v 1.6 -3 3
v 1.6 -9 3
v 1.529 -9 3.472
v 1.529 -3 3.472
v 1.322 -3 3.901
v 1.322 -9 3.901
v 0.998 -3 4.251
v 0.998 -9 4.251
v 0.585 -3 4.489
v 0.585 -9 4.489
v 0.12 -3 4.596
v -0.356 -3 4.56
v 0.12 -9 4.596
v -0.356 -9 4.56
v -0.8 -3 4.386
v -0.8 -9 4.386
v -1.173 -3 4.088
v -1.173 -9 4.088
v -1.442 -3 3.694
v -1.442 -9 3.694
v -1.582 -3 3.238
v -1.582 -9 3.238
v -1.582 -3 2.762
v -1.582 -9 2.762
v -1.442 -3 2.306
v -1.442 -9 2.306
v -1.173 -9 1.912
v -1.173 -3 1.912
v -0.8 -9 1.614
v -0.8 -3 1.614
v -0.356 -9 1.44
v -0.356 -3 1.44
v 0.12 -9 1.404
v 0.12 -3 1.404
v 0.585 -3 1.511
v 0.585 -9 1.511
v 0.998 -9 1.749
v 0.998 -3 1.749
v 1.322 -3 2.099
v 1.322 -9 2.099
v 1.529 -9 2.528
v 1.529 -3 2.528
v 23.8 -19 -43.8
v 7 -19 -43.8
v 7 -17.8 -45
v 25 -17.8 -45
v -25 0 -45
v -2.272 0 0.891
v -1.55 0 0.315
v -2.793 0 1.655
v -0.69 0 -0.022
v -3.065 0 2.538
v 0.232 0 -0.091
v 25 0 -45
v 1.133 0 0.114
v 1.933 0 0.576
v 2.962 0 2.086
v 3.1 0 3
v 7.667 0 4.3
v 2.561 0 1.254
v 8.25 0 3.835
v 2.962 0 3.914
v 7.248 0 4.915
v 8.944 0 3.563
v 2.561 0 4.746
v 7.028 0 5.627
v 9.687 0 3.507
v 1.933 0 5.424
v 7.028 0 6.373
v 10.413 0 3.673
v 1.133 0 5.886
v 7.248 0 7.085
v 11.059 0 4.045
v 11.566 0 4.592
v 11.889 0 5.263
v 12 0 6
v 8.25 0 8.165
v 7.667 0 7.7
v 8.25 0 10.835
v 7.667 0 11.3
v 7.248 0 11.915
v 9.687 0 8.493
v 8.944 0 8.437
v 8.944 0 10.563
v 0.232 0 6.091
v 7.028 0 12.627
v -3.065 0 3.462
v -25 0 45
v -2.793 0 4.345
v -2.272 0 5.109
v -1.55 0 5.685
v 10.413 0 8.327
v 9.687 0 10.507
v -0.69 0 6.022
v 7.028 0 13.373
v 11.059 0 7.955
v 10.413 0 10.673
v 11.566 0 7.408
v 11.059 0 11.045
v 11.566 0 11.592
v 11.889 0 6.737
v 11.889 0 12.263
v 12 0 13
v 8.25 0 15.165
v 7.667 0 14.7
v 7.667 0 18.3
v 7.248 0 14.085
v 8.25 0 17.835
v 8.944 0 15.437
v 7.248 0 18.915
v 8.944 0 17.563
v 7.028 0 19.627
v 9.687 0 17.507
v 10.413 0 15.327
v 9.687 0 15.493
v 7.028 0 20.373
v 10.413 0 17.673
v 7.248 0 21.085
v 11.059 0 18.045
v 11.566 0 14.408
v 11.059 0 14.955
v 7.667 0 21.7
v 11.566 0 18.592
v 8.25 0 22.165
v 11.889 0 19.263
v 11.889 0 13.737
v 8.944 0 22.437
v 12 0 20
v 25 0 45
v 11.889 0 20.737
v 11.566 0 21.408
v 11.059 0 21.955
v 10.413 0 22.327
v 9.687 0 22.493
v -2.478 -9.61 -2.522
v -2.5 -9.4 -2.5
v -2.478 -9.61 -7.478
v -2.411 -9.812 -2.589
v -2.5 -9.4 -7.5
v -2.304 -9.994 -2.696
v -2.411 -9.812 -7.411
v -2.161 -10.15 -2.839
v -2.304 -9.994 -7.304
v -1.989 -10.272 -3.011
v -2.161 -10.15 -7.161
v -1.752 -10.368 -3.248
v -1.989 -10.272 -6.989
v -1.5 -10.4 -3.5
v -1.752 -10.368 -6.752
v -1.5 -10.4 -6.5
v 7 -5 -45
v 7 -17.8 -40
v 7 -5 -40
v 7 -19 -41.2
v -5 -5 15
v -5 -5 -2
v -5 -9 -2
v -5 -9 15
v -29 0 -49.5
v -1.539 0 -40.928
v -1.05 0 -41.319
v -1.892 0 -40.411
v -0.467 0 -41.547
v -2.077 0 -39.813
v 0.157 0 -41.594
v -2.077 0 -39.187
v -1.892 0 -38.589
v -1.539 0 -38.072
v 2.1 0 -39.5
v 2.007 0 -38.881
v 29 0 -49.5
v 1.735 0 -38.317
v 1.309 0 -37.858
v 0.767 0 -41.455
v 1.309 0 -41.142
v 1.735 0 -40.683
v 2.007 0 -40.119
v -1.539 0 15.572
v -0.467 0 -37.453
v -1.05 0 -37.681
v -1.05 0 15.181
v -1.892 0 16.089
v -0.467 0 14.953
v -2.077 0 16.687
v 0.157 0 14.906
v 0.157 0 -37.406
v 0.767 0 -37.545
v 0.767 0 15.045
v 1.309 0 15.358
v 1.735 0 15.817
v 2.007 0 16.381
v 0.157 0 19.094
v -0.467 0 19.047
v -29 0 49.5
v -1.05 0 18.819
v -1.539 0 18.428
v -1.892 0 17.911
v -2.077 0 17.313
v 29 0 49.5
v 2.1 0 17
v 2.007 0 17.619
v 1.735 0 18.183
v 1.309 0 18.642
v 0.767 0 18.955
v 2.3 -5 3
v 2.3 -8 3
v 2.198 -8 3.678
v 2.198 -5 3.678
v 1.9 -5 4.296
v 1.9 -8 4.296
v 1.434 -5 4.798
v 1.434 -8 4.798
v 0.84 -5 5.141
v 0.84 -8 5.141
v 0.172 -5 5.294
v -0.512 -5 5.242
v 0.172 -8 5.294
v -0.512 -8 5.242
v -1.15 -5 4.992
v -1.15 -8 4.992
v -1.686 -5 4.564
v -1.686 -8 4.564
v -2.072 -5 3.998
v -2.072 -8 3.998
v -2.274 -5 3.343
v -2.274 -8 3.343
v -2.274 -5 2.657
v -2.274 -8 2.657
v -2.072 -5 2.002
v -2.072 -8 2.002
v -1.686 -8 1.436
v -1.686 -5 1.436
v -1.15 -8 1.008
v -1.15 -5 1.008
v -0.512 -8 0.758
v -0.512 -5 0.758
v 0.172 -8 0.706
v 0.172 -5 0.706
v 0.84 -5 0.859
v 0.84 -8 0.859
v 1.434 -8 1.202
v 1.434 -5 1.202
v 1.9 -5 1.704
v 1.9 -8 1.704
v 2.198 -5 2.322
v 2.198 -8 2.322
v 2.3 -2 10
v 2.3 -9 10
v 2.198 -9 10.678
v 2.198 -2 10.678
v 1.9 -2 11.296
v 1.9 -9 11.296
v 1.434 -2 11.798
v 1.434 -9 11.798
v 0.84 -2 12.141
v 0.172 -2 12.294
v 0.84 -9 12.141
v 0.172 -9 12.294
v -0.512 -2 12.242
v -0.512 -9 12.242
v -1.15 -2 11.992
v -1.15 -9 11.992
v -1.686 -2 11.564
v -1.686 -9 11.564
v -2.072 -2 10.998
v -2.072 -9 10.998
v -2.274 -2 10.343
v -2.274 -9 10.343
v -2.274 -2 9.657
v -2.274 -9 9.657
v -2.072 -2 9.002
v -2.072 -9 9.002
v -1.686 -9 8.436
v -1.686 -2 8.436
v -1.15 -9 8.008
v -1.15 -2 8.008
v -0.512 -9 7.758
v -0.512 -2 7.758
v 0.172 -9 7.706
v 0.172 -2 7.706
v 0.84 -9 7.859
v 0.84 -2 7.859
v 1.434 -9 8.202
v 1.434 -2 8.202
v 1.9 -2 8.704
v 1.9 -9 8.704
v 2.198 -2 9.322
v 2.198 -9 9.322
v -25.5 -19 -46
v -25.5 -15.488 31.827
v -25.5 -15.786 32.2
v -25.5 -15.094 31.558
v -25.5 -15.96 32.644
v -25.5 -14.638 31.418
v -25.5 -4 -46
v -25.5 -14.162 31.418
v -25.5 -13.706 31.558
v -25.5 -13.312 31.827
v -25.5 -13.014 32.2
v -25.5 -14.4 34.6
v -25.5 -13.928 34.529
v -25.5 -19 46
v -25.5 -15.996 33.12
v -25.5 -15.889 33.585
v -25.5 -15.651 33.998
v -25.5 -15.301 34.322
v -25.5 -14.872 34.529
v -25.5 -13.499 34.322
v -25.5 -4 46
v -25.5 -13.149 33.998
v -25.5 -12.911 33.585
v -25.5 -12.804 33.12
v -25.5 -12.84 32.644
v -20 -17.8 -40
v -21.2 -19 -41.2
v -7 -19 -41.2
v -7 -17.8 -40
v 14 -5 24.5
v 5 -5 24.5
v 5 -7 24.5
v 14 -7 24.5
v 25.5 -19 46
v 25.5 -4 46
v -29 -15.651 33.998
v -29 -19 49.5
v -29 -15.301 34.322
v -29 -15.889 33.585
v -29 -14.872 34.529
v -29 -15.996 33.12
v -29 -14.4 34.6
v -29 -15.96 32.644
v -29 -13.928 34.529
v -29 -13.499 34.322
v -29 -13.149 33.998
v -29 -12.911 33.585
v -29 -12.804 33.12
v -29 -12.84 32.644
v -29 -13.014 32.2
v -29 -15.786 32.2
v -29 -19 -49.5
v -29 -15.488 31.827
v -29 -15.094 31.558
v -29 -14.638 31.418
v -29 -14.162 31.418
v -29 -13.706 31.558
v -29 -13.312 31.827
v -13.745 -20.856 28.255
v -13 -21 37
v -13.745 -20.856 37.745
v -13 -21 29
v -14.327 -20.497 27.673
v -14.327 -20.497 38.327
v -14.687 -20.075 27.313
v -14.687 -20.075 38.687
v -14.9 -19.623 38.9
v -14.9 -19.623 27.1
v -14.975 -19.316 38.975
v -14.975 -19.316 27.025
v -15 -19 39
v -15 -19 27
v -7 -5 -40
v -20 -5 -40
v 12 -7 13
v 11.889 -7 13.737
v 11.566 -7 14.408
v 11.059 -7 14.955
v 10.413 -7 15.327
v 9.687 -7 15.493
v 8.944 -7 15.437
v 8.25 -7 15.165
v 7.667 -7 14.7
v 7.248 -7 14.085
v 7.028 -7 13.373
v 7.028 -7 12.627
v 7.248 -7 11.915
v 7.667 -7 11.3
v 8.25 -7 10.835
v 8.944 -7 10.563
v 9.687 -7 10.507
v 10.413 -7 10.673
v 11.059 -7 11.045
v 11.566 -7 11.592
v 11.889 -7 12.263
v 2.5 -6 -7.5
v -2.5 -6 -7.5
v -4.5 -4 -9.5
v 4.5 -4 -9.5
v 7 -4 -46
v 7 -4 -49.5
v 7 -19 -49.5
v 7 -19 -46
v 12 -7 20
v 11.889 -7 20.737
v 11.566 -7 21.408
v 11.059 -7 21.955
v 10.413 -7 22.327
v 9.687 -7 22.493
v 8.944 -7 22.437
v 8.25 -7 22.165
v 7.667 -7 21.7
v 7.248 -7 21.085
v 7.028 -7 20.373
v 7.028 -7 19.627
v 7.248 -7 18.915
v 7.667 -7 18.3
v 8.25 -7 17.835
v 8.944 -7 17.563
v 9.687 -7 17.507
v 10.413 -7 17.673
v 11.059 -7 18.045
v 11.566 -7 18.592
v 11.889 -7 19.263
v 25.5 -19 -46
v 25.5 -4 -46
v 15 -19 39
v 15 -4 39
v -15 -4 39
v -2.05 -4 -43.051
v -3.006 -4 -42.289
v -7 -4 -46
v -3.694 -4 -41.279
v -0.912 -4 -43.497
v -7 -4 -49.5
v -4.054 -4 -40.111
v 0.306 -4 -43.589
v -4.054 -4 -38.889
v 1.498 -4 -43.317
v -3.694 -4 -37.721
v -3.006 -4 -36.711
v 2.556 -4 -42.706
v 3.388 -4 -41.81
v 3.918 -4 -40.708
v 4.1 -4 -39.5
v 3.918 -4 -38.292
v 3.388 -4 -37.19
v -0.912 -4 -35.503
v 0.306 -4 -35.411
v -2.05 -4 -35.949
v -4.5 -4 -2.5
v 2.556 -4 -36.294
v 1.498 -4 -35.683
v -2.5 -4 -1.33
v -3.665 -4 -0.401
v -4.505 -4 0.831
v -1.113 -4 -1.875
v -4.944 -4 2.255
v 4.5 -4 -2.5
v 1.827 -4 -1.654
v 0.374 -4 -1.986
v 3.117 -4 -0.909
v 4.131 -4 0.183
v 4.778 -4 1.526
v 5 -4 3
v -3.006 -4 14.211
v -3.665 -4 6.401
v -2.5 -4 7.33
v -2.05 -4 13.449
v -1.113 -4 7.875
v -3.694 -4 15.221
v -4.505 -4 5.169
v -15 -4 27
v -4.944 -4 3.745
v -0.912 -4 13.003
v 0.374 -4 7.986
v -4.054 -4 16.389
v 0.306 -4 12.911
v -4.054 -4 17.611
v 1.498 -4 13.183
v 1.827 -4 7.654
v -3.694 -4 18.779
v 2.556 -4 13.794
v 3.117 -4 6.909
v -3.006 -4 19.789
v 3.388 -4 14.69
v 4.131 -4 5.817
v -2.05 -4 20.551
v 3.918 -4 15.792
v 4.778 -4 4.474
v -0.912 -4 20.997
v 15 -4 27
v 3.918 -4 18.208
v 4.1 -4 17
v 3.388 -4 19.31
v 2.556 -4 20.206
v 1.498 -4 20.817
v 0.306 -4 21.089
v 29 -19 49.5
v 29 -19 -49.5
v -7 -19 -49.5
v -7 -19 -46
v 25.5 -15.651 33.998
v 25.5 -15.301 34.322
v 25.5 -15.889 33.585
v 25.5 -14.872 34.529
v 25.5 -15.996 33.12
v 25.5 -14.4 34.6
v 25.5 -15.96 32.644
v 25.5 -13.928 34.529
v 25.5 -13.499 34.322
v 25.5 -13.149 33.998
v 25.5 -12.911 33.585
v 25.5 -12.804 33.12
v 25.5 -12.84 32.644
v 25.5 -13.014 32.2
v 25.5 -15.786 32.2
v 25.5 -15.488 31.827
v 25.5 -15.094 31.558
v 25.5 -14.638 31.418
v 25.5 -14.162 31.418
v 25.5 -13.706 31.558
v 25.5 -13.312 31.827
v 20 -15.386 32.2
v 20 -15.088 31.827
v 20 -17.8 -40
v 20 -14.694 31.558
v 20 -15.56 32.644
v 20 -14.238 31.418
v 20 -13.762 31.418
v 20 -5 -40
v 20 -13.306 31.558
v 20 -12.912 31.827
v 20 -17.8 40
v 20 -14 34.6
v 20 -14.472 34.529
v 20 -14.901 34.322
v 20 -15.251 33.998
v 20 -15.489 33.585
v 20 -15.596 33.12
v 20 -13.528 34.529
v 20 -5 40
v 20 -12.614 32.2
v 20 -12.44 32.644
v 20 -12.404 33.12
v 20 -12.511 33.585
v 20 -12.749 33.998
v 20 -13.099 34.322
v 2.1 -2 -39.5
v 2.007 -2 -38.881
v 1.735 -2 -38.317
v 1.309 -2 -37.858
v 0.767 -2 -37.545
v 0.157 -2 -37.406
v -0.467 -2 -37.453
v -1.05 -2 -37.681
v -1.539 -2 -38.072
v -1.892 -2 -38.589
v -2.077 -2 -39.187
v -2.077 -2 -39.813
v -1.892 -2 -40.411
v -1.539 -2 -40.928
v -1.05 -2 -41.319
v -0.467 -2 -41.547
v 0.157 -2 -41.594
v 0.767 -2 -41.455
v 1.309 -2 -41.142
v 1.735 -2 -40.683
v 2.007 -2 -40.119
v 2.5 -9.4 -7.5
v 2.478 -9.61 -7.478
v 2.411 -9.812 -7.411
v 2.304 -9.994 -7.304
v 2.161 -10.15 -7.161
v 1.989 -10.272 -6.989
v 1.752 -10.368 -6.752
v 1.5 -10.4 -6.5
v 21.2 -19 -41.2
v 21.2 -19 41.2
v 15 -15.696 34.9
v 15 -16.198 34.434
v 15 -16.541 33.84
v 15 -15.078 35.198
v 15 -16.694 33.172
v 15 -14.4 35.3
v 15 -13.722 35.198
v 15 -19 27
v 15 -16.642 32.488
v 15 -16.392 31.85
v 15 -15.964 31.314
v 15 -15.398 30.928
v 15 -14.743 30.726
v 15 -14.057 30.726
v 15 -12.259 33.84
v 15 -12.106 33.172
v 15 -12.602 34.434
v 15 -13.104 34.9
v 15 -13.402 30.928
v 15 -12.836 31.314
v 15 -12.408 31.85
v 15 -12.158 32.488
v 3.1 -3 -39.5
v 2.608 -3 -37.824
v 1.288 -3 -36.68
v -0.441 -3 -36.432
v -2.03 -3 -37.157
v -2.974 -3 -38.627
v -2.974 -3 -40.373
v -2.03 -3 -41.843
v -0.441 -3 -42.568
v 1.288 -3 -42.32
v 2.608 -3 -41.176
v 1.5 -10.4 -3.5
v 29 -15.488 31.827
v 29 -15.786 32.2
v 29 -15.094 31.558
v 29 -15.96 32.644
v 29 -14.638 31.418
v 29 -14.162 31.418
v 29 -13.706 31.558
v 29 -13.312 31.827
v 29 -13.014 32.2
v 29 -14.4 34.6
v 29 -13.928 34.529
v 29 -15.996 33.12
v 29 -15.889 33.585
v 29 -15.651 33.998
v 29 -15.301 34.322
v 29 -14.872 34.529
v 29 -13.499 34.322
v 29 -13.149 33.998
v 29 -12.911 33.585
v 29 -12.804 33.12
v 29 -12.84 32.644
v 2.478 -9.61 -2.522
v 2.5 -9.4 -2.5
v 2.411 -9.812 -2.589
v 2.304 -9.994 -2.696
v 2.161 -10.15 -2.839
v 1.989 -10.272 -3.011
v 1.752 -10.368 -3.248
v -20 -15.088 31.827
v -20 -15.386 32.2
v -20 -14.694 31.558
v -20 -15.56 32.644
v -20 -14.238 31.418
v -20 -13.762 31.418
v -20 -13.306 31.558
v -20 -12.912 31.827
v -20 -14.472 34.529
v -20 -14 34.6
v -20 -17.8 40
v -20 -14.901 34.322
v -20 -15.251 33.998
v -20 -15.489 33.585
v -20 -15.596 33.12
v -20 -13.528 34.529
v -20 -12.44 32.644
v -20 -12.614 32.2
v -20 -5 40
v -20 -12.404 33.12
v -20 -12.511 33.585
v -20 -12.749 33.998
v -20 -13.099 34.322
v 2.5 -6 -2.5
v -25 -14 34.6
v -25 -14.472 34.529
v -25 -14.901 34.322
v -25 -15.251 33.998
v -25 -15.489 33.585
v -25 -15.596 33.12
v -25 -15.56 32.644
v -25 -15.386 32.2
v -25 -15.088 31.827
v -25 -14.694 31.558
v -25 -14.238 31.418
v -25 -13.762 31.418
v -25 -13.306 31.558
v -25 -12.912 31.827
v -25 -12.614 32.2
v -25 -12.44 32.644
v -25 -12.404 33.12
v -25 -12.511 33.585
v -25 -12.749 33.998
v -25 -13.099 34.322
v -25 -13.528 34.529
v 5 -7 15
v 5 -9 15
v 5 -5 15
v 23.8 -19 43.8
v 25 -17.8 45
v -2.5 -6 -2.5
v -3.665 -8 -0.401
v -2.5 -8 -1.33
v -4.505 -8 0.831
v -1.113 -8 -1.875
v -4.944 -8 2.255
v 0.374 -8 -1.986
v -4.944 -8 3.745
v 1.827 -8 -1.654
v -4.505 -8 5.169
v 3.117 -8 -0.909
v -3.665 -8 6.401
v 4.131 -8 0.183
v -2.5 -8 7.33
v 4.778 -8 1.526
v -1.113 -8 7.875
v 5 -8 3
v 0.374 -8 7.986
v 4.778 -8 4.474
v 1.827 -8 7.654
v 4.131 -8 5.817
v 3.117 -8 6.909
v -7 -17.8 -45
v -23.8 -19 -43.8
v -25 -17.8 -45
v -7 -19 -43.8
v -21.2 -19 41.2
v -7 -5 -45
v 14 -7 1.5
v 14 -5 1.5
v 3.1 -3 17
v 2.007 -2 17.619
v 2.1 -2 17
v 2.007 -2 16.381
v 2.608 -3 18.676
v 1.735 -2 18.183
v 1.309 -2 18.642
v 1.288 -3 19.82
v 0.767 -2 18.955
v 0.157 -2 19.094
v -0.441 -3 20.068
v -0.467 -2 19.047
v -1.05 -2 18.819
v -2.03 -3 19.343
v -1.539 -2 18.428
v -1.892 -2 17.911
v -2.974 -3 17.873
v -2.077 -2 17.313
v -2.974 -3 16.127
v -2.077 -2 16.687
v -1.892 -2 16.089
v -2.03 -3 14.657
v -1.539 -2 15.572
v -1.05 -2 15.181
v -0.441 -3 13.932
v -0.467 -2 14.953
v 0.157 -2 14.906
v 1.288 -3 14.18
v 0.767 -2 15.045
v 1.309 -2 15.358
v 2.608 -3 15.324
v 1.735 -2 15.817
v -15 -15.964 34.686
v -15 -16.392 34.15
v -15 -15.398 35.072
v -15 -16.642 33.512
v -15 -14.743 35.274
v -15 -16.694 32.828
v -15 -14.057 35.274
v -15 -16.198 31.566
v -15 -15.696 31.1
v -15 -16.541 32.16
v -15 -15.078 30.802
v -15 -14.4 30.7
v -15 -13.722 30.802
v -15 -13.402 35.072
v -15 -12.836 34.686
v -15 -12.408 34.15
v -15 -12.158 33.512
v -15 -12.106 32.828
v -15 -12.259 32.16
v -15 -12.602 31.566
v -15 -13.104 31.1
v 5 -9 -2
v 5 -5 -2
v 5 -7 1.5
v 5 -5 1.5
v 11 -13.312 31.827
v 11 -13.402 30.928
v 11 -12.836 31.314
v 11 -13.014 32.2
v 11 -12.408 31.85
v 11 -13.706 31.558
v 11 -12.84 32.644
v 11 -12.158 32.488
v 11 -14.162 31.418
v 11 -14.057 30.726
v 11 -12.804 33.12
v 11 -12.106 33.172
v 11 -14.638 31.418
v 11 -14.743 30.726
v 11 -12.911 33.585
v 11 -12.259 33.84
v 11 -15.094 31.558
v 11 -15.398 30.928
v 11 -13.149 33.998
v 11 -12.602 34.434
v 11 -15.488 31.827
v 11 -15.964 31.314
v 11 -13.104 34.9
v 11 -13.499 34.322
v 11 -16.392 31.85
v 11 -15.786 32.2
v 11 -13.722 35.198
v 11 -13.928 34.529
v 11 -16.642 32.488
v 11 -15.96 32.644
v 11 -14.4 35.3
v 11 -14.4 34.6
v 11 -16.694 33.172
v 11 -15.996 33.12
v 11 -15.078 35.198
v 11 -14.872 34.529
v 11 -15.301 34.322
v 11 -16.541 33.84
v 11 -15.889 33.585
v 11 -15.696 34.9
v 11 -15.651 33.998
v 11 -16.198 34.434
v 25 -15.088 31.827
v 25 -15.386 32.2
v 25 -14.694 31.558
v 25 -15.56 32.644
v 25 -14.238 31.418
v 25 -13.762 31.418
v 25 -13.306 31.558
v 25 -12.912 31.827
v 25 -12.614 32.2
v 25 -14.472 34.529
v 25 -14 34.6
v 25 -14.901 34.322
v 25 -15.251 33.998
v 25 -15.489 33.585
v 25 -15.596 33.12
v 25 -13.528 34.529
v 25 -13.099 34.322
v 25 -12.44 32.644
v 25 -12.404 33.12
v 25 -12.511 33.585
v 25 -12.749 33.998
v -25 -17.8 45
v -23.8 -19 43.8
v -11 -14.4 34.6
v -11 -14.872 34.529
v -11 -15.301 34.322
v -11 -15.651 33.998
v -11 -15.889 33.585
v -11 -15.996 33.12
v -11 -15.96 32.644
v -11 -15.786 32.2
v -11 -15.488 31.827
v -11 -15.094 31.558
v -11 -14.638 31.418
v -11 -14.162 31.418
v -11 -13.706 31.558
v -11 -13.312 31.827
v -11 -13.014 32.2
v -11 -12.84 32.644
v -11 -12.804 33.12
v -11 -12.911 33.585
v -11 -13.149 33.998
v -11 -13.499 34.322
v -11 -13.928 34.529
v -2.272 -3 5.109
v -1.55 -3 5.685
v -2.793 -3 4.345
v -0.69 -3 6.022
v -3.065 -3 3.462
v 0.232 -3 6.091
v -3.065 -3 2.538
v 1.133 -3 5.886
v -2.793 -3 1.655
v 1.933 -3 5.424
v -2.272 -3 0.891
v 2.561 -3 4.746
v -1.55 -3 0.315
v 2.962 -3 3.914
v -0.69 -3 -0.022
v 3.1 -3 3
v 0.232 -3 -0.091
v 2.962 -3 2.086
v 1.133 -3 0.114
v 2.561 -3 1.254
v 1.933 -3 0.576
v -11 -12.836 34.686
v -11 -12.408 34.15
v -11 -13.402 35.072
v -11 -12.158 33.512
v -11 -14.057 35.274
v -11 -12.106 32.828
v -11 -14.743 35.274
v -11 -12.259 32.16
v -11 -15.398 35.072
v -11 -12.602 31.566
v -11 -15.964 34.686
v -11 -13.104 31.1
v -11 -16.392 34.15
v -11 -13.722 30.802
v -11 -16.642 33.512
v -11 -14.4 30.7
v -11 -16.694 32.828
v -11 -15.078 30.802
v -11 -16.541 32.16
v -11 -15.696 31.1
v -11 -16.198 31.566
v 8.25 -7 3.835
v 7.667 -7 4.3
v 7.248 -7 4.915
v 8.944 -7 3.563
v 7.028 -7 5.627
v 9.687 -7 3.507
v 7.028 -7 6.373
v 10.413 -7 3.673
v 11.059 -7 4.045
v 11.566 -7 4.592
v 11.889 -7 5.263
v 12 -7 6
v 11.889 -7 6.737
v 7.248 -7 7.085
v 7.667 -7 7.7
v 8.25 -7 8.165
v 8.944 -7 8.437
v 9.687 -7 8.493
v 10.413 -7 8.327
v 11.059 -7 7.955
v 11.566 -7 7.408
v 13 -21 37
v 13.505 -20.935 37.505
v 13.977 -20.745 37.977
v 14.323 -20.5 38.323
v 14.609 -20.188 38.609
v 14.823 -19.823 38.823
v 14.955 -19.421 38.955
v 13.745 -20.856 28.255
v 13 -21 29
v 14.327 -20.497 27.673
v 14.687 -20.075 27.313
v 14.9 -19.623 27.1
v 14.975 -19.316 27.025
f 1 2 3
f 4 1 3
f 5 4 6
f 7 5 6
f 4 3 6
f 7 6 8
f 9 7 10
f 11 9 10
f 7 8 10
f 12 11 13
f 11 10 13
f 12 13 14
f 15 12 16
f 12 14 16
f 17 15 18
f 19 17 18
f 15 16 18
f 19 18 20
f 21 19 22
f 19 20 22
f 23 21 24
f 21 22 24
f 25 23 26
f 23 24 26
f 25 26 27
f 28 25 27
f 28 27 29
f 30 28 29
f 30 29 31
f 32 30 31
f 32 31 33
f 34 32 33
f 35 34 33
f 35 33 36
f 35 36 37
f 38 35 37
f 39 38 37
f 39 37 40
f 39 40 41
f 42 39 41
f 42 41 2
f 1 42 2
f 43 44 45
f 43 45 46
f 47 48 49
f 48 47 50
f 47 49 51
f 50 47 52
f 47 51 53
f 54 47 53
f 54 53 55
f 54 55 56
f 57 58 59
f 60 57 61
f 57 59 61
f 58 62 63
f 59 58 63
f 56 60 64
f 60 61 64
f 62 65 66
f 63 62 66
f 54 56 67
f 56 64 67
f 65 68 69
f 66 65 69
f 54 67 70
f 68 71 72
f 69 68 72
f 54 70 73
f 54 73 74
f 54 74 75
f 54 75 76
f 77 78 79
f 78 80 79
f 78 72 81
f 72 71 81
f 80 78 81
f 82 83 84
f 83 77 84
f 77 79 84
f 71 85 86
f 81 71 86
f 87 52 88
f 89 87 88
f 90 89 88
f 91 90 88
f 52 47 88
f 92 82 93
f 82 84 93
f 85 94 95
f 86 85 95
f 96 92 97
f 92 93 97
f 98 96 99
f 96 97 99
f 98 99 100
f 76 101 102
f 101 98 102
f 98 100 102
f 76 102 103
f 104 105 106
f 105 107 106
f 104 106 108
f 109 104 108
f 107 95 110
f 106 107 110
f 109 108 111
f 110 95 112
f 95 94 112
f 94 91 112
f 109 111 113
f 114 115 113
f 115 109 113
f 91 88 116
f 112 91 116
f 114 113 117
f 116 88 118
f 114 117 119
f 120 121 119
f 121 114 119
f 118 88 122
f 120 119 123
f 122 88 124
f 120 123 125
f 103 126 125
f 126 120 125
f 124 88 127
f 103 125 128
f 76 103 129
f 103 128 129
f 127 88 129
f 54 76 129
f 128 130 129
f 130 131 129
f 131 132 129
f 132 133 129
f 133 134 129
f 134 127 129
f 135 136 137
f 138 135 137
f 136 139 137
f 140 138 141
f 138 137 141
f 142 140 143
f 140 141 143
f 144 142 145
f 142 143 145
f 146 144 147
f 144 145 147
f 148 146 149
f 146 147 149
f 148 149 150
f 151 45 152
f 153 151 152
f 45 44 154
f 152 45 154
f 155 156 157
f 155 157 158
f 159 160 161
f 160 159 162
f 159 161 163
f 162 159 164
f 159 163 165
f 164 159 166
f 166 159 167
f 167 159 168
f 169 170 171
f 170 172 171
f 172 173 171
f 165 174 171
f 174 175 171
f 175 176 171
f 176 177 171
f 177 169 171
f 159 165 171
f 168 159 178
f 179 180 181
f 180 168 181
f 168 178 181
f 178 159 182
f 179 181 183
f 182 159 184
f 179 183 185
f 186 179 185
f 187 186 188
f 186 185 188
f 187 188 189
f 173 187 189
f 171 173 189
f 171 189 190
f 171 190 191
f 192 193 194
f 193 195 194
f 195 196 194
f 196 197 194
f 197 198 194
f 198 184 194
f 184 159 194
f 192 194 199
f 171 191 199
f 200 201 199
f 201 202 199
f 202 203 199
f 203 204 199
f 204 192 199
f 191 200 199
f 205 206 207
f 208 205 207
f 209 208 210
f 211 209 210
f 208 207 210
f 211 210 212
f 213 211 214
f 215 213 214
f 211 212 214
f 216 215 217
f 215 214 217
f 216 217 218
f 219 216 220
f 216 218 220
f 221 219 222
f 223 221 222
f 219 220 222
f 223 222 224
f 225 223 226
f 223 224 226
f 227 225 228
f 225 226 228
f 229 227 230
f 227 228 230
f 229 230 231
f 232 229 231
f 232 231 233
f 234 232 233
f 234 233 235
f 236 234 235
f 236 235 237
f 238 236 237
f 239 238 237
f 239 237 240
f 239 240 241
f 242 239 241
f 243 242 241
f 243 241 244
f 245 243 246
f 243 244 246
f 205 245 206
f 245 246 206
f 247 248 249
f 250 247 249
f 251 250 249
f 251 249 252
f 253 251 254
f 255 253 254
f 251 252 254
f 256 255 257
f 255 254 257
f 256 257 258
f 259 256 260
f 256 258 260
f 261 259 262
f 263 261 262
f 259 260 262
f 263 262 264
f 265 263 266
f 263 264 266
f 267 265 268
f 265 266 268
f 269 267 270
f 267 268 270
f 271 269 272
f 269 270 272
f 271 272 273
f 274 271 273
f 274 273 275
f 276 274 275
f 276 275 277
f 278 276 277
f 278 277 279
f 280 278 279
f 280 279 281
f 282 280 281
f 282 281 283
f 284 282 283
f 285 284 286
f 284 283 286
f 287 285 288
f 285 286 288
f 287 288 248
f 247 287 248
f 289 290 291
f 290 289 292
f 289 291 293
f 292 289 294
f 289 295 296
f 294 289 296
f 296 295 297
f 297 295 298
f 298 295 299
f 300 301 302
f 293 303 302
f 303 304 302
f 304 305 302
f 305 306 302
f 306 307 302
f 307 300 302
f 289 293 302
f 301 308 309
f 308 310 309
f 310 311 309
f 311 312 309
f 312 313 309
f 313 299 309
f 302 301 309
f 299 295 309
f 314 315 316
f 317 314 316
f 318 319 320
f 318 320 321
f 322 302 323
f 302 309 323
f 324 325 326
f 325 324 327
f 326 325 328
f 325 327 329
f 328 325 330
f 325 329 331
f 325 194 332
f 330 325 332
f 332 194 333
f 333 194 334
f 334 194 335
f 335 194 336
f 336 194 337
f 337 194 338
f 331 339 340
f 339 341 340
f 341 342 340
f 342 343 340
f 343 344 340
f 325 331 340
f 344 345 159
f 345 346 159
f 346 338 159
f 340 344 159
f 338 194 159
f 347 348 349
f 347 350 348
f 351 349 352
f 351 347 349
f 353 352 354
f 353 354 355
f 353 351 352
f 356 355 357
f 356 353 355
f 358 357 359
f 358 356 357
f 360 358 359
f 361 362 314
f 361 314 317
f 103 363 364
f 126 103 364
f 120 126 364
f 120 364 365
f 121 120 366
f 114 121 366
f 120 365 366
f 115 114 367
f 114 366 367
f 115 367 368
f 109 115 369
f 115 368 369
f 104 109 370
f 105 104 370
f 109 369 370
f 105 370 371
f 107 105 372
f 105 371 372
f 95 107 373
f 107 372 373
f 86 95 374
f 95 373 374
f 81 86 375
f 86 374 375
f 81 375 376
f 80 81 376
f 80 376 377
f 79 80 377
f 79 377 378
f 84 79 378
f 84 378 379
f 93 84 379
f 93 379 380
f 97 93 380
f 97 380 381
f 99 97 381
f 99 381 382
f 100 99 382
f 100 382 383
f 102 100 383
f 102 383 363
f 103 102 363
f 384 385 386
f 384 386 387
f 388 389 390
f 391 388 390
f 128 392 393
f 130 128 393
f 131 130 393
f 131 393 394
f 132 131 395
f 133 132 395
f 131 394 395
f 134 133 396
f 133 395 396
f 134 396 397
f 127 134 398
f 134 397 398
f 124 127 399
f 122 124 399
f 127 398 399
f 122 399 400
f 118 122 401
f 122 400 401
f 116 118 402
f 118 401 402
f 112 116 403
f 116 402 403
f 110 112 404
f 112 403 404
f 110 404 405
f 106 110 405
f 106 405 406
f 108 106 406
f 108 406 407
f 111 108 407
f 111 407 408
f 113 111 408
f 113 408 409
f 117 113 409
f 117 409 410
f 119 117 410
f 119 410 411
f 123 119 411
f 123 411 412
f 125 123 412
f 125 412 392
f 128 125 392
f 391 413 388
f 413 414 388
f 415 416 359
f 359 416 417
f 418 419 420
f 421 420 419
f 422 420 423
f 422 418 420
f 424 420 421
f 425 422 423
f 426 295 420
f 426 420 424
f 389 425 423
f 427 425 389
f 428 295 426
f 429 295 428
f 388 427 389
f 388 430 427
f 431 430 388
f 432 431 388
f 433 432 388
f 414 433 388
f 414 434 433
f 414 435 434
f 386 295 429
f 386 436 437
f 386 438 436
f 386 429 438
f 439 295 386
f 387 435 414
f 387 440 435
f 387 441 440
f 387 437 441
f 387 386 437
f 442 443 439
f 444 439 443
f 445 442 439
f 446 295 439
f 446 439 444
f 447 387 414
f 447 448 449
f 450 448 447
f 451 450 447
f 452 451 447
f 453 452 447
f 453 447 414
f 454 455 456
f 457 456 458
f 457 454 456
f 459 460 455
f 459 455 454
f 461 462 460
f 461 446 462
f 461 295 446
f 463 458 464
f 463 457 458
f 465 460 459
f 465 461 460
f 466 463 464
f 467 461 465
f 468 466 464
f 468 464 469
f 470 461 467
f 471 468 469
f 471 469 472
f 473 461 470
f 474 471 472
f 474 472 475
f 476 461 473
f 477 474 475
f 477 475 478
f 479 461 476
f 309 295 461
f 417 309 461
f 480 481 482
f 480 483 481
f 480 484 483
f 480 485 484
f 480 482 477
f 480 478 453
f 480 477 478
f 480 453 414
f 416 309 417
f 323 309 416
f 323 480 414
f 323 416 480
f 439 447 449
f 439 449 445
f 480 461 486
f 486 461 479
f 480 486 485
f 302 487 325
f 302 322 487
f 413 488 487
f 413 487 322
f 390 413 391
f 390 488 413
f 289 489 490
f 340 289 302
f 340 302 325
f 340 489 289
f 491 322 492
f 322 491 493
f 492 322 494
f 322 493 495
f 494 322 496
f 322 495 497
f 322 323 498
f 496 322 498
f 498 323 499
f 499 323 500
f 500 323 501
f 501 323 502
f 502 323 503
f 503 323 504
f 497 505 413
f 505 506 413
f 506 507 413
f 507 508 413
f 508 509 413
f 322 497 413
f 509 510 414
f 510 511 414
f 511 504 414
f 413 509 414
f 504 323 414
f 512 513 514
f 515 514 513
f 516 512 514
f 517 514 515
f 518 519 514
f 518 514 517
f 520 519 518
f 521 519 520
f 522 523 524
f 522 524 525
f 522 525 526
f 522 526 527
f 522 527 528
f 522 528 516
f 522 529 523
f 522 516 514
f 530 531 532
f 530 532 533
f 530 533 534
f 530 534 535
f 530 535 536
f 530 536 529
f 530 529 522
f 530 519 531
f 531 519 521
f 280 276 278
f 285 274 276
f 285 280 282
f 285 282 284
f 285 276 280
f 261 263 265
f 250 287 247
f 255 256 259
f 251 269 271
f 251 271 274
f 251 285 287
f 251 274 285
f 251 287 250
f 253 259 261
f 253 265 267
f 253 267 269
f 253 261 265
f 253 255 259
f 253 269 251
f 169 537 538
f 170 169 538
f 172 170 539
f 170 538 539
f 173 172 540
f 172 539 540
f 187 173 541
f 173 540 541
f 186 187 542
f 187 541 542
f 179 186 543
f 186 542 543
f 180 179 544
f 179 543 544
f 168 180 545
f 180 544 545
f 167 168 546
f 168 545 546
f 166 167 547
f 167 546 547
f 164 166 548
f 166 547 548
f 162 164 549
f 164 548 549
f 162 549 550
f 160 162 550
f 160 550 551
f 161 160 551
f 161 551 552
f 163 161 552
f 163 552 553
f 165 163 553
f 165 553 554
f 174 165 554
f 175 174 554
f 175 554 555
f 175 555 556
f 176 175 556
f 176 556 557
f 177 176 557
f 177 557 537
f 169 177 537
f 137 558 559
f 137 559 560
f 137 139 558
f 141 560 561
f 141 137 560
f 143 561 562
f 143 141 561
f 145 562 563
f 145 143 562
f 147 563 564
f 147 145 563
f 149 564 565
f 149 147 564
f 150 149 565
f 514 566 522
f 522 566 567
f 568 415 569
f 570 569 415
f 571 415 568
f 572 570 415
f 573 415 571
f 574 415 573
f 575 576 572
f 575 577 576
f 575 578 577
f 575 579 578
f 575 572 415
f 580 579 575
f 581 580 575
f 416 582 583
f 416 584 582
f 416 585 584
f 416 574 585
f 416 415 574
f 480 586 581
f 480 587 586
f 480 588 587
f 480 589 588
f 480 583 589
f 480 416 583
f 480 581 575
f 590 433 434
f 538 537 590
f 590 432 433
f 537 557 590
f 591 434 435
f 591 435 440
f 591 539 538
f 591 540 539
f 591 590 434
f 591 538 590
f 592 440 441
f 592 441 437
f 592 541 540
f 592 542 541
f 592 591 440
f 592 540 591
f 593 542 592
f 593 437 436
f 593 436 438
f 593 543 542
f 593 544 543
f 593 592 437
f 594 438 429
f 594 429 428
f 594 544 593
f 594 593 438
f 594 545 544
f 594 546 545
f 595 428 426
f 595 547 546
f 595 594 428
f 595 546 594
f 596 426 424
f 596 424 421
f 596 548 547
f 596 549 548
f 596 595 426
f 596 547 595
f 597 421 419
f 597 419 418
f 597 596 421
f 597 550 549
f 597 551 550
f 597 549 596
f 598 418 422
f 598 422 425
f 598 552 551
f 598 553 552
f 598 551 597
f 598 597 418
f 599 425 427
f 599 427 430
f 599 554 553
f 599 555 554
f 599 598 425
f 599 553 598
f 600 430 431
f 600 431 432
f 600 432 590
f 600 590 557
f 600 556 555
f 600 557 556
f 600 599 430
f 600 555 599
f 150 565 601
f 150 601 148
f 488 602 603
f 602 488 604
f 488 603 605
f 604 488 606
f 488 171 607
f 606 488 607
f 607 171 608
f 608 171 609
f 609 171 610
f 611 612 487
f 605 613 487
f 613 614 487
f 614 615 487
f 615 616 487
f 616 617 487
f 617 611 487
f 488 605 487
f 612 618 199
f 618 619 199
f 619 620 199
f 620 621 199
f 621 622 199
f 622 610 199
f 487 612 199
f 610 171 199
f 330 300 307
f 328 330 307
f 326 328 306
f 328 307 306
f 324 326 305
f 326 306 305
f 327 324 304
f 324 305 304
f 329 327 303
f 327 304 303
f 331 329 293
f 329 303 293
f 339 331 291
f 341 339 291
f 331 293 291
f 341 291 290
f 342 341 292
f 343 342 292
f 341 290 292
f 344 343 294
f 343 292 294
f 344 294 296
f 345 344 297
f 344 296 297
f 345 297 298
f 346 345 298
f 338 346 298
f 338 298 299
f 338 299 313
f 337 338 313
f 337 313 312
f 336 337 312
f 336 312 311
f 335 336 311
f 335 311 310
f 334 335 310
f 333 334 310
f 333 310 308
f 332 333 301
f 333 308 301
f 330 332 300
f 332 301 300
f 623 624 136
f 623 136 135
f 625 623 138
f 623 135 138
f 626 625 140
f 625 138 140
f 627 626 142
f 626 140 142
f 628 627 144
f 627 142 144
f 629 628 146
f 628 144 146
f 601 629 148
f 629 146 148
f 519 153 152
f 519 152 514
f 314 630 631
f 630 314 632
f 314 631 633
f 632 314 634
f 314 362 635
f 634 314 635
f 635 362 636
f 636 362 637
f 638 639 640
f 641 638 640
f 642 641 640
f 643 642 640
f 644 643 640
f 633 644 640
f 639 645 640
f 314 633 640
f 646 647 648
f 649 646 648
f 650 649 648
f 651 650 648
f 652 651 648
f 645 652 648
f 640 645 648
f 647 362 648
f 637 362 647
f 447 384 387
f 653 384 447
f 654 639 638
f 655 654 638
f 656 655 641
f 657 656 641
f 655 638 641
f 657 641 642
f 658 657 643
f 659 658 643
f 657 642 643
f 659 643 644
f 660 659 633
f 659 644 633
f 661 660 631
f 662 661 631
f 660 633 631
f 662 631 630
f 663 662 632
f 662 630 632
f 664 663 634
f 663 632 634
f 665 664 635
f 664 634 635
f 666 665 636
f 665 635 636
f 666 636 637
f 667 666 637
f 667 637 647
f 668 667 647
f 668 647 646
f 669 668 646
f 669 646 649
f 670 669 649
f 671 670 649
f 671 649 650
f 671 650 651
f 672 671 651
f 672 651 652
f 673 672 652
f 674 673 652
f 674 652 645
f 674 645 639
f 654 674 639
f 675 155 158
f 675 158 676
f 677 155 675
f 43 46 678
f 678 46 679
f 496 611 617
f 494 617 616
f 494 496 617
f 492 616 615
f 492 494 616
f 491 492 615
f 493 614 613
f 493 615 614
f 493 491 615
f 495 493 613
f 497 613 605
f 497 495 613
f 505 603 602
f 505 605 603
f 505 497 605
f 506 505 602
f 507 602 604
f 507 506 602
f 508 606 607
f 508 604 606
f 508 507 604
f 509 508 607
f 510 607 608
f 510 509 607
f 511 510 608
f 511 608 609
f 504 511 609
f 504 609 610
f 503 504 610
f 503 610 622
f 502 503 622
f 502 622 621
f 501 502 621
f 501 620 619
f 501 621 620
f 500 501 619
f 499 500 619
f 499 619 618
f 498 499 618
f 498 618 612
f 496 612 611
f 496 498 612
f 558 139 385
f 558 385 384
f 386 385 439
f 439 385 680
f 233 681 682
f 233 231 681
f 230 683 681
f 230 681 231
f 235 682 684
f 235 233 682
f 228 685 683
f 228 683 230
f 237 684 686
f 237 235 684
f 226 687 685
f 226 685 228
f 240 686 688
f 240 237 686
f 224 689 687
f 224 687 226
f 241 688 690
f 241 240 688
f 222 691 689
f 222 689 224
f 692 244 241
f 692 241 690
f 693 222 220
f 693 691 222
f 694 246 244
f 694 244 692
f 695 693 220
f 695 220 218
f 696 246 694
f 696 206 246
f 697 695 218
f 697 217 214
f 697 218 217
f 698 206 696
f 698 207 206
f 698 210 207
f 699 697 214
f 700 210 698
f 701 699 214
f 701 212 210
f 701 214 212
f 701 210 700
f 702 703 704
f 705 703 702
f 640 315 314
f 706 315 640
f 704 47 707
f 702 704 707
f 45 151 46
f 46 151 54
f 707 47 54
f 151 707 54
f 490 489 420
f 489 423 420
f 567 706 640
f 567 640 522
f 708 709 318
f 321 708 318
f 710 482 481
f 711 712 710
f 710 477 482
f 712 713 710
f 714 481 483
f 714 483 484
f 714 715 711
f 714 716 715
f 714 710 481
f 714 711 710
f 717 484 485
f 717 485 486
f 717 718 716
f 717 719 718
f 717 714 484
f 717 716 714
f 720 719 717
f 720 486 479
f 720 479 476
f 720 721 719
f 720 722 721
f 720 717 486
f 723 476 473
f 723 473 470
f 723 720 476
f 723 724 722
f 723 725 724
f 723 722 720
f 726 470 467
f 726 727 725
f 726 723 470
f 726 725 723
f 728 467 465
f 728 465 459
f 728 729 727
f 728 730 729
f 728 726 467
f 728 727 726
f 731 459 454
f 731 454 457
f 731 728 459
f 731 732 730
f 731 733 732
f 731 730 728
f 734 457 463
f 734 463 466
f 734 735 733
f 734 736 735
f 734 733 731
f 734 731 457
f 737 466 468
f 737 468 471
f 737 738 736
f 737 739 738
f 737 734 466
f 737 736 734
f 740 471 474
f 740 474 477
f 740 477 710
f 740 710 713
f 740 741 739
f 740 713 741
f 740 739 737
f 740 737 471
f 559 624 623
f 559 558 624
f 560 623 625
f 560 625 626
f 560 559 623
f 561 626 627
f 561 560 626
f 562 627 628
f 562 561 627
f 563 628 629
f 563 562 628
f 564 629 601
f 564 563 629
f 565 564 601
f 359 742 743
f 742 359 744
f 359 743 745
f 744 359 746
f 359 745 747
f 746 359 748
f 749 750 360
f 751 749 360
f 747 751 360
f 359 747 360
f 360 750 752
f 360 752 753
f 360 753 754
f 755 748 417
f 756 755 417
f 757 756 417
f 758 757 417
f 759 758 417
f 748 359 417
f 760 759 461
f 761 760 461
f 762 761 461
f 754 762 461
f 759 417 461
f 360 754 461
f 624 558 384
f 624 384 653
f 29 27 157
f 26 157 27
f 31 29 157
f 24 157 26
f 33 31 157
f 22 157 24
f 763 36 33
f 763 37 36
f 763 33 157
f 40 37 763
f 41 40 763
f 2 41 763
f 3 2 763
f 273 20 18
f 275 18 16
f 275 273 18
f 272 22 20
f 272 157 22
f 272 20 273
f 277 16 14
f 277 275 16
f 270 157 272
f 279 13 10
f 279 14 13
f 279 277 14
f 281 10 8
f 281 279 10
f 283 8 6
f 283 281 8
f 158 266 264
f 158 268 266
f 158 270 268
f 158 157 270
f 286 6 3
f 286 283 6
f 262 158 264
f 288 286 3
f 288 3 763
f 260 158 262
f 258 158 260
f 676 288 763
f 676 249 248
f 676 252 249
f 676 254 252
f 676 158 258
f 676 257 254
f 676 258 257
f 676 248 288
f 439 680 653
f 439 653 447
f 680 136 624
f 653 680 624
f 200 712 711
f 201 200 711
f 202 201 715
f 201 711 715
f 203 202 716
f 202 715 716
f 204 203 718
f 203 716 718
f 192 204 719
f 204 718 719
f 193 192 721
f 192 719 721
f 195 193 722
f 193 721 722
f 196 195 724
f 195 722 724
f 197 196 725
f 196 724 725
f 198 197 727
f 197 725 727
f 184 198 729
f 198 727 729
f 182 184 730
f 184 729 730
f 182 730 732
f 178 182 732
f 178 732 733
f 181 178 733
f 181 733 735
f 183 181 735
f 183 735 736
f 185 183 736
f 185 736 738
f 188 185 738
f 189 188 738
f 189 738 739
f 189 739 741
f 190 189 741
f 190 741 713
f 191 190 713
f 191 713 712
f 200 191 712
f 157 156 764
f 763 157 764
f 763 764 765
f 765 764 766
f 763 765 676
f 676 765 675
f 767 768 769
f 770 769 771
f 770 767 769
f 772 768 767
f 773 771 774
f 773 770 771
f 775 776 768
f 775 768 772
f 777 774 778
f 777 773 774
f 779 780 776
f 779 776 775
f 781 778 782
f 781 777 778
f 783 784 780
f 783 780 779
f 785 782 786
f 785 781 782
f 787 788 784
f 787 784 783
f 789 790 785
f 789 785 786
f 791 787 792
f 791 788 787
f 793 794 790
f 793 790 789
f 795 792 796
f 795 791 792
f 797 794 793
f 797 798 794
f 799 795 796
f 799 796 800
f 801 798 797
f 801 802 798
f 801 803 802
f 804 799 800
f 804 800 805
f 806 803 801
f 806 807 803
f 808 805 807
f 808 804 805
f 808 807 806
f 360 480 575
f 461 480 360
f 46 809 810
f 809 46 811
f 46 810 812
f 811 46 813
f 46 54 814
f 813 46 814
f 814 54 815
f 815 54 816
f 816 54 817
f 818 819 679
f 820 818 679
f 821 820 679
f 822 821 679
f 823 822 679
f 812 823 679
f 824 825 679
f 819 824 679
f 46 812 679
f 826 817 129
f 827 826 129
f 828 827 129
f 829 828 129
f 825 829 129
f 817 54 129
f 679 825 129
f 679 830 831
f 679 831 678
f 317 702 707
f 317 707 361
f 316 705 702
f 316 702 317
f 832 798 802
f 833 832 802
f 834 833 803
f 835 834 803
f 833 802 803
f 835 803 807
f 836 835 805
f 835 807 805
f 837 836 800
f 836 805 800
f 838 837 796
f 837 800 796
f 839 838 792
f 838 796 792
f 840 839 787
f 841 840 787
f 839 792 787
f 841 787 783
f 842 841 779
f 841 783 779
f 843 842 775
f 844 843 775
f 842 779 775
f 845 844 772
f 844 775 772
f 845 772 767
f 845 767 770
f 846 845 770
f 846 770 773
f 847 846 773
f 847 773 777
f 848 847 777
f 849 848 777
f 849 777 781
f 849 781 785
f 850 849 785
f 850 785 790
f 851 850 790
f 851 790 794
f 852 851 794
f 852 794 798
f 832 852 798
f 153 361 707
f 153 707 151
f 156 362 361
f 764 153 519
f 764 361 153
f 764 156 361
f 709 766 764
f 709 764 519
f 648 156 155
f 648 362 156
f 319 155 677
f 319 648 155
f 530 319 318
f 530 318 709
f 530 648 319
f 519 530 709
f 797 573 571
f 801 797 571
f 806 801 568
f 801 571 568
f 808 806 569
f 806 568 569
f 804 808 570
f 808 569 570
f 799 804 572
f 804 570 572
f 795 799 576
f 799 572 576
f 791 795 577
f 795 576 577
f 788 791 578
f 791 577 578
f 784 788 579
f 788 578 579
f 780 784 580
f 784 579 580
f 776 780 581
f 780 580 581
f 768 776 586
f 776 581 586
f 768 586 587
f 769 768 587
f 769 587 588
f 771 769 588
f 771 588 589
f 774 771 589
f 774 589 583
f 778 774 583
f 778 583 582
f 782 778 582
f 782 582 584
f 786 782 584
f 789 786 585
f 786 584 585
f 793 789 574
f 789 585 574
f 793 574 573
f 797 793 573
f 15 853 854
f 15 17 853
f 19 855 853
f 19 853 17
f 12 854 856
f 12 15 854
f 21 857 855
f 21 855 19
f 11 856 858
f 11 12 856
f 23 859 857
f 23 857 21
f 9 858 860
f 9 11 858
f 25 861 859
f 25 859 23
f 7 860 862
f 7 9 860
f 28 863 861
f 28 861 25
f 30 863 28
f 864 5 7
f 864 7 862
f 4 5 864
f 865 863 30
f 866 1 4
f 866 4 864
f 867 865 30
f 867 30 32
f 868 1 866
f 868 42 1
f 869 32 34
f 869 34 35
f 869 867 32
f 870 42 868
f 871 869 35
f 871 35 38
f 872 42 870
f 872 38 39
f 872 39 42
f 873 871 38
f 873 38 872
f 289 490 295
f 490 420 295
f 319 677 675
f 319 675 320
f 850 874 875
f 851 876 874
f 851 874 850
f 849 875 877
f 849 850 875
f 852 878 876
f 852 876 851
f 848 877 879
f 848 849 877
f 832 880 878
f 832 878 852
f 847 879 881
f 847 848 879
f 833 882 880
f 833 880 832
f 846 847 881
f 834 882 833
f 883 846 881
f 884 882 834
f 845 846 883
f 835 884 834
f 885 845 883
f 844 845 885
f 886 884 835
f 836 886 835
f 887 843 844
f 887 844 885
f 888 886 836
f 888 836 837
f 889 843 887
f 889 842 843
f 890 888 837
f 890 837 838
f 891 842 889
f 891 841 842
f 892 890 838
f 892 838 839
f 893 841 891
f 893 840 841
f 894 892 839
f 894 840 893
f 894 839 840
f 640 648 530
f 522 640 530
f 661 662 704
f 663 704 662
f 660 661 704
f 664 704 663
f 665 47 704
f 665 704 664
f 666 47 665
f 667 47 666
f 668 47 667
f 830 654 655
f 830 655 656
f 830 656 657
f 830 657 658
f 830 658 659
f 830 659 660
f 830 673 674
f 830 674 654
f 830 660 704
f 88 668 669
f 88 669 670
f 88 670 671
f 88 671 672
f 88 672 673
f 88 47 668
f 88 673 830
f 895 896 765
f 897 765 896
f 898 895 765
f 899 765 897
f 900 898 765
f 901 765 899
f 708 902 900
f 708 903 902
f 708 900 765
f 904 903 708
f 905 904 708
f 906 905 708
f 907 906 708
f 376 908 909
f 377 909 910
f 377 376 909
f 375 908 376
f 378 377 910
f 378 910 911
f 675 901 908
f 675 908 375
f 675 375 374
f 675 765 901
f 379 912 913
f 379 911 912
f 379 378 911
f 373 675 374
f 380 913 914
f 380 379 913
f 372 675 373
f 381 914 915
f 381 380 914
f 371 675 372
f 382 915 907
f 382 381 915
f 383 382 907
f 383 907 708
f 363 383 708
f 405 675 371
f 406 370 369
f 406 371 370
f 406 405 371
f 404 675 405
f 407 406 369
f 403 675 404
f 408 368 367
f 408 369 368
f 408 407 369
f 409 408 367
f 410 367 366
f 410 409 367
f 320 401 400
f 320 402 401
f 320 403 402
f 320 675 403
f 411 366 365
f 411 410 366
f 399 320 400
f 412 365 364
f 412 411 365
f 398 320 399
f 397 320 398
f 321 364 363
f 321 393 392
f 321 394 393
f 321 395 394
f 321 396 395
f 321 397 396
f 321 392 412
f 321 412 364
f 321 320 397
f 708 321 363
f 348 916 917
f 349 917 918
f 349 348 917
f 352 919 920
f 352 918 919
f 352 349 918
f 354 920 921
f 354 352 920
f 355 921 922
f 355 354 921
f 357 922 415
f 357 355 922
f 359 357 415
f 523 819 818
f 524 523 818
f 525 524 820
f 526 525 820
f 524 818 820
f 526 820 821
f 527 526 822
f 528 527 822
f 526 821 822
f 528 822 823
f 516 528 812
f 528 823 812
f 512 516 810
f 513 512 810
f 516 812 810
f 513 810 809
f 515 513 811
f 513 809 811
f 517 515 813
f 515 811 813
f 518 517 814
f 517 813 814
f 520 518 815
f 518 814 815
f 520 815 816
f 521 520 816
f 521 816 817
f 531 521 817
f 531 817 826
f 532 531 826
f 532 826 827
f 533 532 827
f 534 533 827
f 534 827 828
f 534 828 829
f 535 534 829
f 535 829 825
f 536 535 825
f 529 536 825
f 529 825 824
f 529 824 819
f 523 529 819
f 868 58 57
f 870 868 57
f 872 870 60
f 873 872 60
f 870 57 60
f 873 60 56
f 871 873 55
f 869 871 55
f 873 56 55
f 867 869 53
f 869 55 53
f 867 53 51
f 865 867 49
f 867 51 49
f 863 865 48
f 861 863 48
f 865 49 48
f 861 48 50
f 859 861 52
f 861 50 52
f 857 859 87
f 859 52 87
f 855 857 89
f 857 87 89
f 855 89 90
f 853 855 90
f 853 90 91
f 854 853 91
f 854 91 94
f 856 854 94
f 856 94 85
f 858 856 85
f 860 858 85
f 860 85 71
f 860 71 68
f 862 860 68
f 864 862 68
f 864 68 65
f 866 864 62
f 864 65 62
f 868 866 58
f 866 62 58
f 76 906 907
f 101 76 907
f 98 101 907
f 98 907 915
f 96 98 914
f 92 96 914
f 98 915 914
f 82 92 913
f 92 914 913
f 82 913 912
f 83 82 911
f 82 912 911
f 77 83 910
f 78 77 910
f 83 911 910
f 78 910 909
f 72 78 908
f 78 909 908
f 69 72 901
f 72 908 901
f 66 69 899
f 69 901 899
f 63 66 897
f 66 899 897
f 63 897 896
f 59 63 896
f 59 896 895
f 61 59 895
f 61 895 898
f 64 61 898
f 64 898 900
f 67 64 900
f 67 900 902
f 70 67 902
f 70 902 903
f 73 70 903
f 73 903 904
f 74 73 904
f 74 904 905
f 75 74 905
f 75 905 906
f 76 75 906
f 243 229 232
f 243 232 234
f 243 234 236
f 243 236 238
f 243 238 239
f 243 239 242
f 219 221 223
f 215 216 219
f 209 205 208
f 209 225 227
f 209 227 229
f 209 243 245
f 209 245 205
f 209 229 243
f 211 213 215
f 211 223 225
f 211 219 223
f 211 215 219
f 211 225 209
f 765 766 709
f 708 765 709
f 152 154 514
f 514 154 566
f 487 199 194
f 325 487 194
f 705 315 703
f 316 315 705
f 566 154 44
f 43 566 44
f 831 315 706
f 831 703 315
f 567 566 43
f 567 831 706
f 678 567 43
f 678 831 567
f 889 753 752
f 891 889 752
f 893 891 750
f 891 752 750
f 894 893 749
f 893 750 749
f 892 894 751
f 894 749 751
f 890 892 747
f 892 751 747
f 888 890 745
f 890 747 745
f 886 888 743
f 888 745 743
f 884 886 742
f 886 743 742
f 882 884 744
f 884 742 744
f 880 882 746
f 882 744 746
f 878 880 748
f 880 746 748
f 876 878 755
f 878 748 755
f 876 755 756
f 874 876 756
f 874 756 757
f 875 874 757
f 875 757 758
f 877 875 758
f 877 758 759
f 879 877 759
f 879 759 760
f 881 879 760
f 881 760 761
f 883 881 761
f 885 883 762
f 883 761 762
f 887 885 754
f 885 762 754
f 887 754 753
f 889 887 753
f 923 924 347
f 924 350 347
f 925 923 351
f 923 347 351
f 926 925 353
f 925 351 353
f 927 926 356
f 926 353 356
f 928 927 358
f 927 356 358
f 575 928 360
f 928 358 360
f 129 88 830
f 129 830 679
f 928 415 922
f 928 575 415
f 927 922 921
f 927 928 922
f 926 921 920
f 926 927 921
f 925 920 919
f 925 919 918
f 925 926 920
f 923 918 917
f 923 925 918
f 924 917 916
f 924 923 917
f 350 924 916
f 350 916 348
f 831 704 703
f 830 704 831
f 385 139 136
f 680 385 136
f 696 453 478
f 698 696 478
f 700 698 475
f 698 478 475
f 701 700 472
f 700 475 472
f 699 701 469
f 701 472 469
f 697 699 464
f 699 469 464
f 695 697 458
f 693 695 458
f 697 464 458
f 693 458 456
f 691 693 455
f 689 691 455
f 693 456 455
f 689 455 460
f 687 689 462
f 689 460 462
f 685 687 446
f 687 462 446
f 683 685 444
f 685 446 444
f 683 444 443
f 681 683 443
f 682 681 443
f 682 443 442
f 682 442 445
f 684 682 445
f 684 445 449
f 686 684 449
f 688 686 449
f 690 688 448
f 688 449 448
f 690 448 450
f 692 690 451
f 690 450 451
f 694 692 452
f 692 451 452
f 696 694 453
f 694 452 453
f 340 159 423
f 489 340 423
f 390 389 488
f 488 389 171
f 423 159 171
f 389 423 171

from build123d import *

# Parameters (mm, degrees)
SKETCH006_W          = 58
SKETCH006_H          = 99
PAD004_DEPTH         = 16
SKETCH007_W          = 51
SKETCH007_H          = 92
SKETCH007_W_2        = 30
SKETCH007_H_2        = 12
SKETCH007_W_3        = 5
SKETCH007_H_3        = 5
POCKET004_DEPTH      = 12
POCKET004_FACE21_W   = 5
POCKET004_FACE21_H   = 5
POCKET005_DEPTH      = 5.6
POCKET005_FACE20_W   = 30
POCKET005_FACE20_H   = 12
PAD005_DEPTH         = 5
SKETCH009_R          = 2.3
POCKET006_DEPTH      = 4
SKETCH010_R          = 2.3
POCKET007_DEPTH      = 4
SKETCH011_R          = 1.6
POCKET008_DEPTH      = 40.001
POCKET008_DEPTH_BACK = -18.001
FILLET_R             = 2
FILLET001_R          = 1
SKETCH012_W          = 14
SKETCH012_H          = 12
POCKET009_DEPTH      = 3.5
SKETCH015_R          = 5
PAD007_DEPTH         = 4
SKETCH016_R          = 2.3
POCKET012_DEPTH      = 3
PAD012_DEPTH         = 3
SKETCH_R             = 2.1
POCKET_DEPTH         = 4.001
CHAMFER_SIZE         = 2
CHAMFER001_SIZE      = 2
SKETCH017_W          = 50
SKETCH017_H          = 90
PAD008_DEPTH         = 5
SKETCH018_W          = 50
SKETCH018_H          = 90
SKETCH018_W_2        = 40
SKETCH018_H_2        = 80
PAD009_DEPTH         = 14
SKETCH019_W          = 14
SKETCH019_H          = 5
POCKET013_DEPTH      = 14
SKETCH020_W          = 10
SKETCH020_H          = 17
PAD010_DEPTH         = 4
SKETCH021_R          = 2.3
SKETCH021_R_2        = 1.6
POCKET014_DEPTH      = 7
POCKET014_FACE22_R   = 1.6
POCKET015_DEPTH      = 2.001
SKETCH022_R          = 3.1
POCKET016_DEPTH      = 3
SKETCH023_W          = 9
SKETCH023_H          = 23
PAD011_DEPTH         = 2
SKETCH024_R          = 2.5
POCKET017_DEPTH      = 7.001
SKETCH025_R          = 1.6
POCKET018_DEPTH      = 50.001
CHAMFER002_SIZE      = 1.2


with BuildPart() as backplate:
    # Sketch006 → Pad004 (new body)
    with BuildSketch(Plane.XZ):
        Rectangle(SKETCH006_W, SKETCH006_H)
    extrude(amount=PAD004_DEPTH)

    # Sketch007 (on Face6 of Pad004) → Pocket004 (cut)
    with BuildSketch(Plane.XZ.offset(16)):
        Rectangle(SKETCH007_W, SKETCH007_H)
        with Locations((0, 33)):
            Rectangle(SKETCH007_W_2, SKETCH007_H_2, mode=Mode.SUBTRACT)
        with Locations((0, -5)):
            Rectangle(SKETCH007_W_3, SKETCH007_H_3, mode=Mode.SUBTRACT)
    extrude(amount=-POCKET004_DEPTH, mode=Mode.SUBTRACT)

    # Pocket004 Face21 → Pocket005 (cut)
    with BuildSketch(Plane(origin=(0, -16, -5), x_dir=(-1, 0, 0), z_dir=(0, -1, 0))):
        Rectangle(POCKET004_FACE21_W, POCKET004_FACE21_H)
    extrude(amount=-POCKET005_DEPTH, mode=Mode.SUBTRACT)

    # Pocket005 Face20 → Pad005 (add)
    with BuildSketch(Plane(origin=(0, -16, 33), x_dir=(-1, 0, 0), z_dir=(0, -1, 0))):
        Rectangle(POCKET005_FACE20_W, POCKET005_FACE20_H)
    extrude(amount=PAD005_DEPTH)

    # Sketch009 (on Face20 of Pad005) → Pocket006 (cut)
    with BuildSketch(Plane(origin=(15, 0, 0), x_dir=(0, 0, 1), z_dir=(1, 0, 0))):
        with Locations((33, 14.4)):
            Circle(SKETCH009_R)
    extrude(amount=-POCKET006_DEPTH, mode=Mode.SUBTRACT)

    # Sketch010 (on Face12 of Pocket006) → Pocket007 (cut)
    with BuildSketch(Plane(origin=(-15, 0, 0), x_dir=(0, 0, -1), z_dir=(-1, 0, 0))):
        with Locations((-33, 14.4)):
            Circle(SKETCH010_R)
    extrude(amount=-POCKET007_DEPTH, mode=Mode.SUBTRACT)

    # Sketch011 (on Face25 of Pocket007) → Pocket008 (cut, two sides)
    with BuildSketch(Plane(origin=(11, 0, 0), x_dir=(0, 0, 1), z_dir=(1, 0, 0))) as pocket008_sk:
        with Locations((33, 14.4)):
            Circle(SKETCH011_R)
    extrude(amount=-POCKET008_DEPTH, mode=Mode.SUBTRACT)
    extrude(pocket008_sk.sketch, amount=-POCKET008_DEPTH_BACK, mode=Mode.SUBTRACT)

    # Fillet
    fillet_edges = [backplate.edges().sort_by_distance(p)[0] for p in [
        (-15, -21, 33),
        (0, -21, 27),
        (15, -21, 33),
        (0, -21, 39),
    ]]
    fillet(fillet_edges, radius=FILLET_R)

    # Fillet001
    fillet001_edges = [backplate.edges().sort_by_distance(p)[0] for p in [
        (0, -10.4, -7.5),
        (2.5, -10.4, -5),
        (0, -10.4, -2.5),
        (-2.5, -10.4, -5),
    ]]
    fillet(fillet001_edges, radius=FILLET001_R)

    # Sketch012 (on Face28 of Fillet001) → Pocket009 (cut)
    with BuildSketch(Plane(origin=(0, 0, -49.5), x_dir=(1, 0, 0), z_dir=(0, 0, -1))):
        with Locations((0, 10)):
            Rectangle(SKETCH012_W, SKETCH012_H)
    extrude(amount=-POCKET009_DEPTH, mode=Mode.SUBTRACT)

    # Sketch015 (on Face16 of Pocket009) → Pad007 (join)
    with BuildSketch(Plane.XZ.offset(4)):
        with Locations((0, 3)):
            Circle(SKETCH015_R)
    extrude(amount=PAD007_DEPTH)

    # Sketch016 (on Face30 of Pad007) → Pocket012 (cut)
    with BuildSketch(Plane.XZ.offset(8)):
        with Locations((0, 3)):
            Circle(SKETCH016_R)
    extrude(amount=-POCKET012_DEPTH, mode=Mode.SUBTRACT)

    # Pocket012 Face2 → Pad012 (add)
    with BuildSketch(Plane(origin=(0, -16, 2.337413), x_dir=(-1, 0, 0), z_dir=(0, -1, 0))):
        Polygon((29, -30.662587), (29, 51.837413), (7, 51.837413), (7, 48.337413), (25.5, 48.337413), (25.5, -30.662587), (25.5, -43.662587), (-25.5, -43.662587), (-25.5, -30.662587), (-25.5, 48.337413), (-7, 48.337413), (-7, 51.837413), (-29, 51.837413), (-29, -30.662587), (-29, -47.162587), (29, -47.162587), align=None)
    extrude(amount=PAD012_DEPTH)

    # Sketch (on Face3 of Pad012) → Pocket (cut, through all)
    with BuildSketch(Plane.XZ.offset(4)):
        with Locations((0, -39.5)):
            Circle(SKETCH_R)
        with Locations((0, 17)):
            Circle(SKETCH_R)
    extrude(amount=-POCKET_DEPTH, mode=Mode.SUBTRACT)

    # Chamfer
    chamfer_edges = [backplate.edges().sort_by_distance(p)[0] for p in [
        (-2.1, -4, 17),
        (-2.1, -4, -39.5),
    ]]
    chamfer(chamfer_edges, length=CHAMFER_SIZE)

    # Chamfer001
    chamfer001_edges = [backplate.edges().sort_by_distance(p)[0] for p in [
        (2.5, -4, -5),
        (0, -4, -7.5),
        (-2.5, -4, -5),
    ]]
    chamfer(chamfer001_edges, length=CHAMFER001_SIZE)


with BuildPart() as pressplate:
    # Sketch017 → Pad008 (new body)
    with BuildSketch(Plane.XZ):
        Rectangle(SKETCH017_W, SKETCH017_H)
    extrude(amount=PAD008_DEPTH)

    # Sketch018 (on Face6 of Pad008) → Pad009 (join)
    with BuildSketch(Plane.XZ.offset(5)):
        Rectangle(SKETCH018_W, SKETCH018_H)
        Rectangle(SKETCH018_W_2, SKETCH018_H_2, mode=Mode.SUBTRACT)
    extrude(amount=PAD009_DEPTH)

    # Sketch019 (on Face3 of Pad009) → Pocket013 (cut)
    with BuildSketch(Plane.XZ.offset(19)):
        with Locations((0, -42.5)):
            Rectangle(SKETCH019_W, SKETCH019_H)
    extrude(amount=-POCKET013_DEPTH, mode=Mode.SUBTRACT)

    # Sketch020 (on Face14 of Pocket013) → Pad010 (join)
    with BuildSketch(Plane.XZ.offset(5)):
        with Locations((0, 6.5)):
            Rectangle(SKETCH020_W, SKETCH020_H)
    extrude(amount=PAD010_DEPTH)

    # Sketch021 (on Face19 of Pad010) → Pocket014 (cut)
    with BuildSketch(Plane.XZ.offset(9)):
        with Locations((0, 10)):
            Circle(SKETCH021_R)
        with Locations((0, 3)):
            Circle(SKETCH021_R_2)
    extrude(amount=-POCKET014_DEPTH, mode=Mode.SUBTRACT)

    # Pocket014 Face22 → Pocket015 (cut, through all)
    with BuildSketch(Plane(origin=(0, -2, 3), x_dir=(-1, 0, 0), z_dir=(0, -1, 0))):
        Circle(POCKET014_FACE22_R)
    extrude(amount=-POCKET015_DEPTH, mode=Mode.SUBTRACT)

    # Sketch022 (on Face1 of Pocket015) → Pocket016 (cut)
    with BuildSketch(Plane(origin=(0, 0, 0), x_dir=(1, 0, 0), z_dir=(0, 1, 0))):
        with Locations((0, -3)):
            Circle(SKETCH022_R)
    extrude(amount=-POCKET016_DEPTH, mode=Mode.SUBTRACT)

    # Sketch023 (on Face9 of Pocket016) → Pad011 (join)
    with BuildSketch(Plane.XZ.offset(5)):
        with Locations((9.5, 13)):
            Rectangle(SKETCH023_W, SKETCH023_H)
    extrude(amount=PAD011_DEPTH)

    # Sketch024 (on Face27 of Pad011) → Pocket017 (cut, through all)
    with BuildSketch(Plane.XZ.offset(7)):
        with Locations((9.5, 20)):
            Circle(SKETCH024_R)
        with Locations((9.5, 13)):
            Circle(SKETCH024_R)
        with Locations((9.5, 6)):
            Circle(SKETCH024_R)
    extrude(amount=-POCKET017_DEPTH, mode=Mode.SUBTRACT)

    # Sketch025 (on Face4 of Pocket017) → Pocket018 (cut, through all)
    with BuildSketch(Plane(origin=(25, 0, 0), x_dir=(0, 0, 1), z_dir=(1, 0, 0))):
        with Locations((33, 14)):
            Circle(SKETCH025_R)
    extrude(amount=-POCKET018_DEPTH, mode=Mode.SUBTRACT)

    # Chamfer002
    chamfer002_edges = [pressplate.edges().sort_by_distance(p)[0] for p in [
        (-20, -19, 0),
        (-25, -19, 0),
        (0, -19, 45),
        (0, -19, 40),
        (20, -19, 0),
        (25, -19, 0),
        (16, -19, -45),
        (13.5, -19, -40),
        (-13.5, -19, -40),
        (-16, -19, -45),
    ]]
    chamfer(chamfer002_edges, length=CHAMFER002_SIZE)


solid = Compound([backplate.part, pressplate.part])
